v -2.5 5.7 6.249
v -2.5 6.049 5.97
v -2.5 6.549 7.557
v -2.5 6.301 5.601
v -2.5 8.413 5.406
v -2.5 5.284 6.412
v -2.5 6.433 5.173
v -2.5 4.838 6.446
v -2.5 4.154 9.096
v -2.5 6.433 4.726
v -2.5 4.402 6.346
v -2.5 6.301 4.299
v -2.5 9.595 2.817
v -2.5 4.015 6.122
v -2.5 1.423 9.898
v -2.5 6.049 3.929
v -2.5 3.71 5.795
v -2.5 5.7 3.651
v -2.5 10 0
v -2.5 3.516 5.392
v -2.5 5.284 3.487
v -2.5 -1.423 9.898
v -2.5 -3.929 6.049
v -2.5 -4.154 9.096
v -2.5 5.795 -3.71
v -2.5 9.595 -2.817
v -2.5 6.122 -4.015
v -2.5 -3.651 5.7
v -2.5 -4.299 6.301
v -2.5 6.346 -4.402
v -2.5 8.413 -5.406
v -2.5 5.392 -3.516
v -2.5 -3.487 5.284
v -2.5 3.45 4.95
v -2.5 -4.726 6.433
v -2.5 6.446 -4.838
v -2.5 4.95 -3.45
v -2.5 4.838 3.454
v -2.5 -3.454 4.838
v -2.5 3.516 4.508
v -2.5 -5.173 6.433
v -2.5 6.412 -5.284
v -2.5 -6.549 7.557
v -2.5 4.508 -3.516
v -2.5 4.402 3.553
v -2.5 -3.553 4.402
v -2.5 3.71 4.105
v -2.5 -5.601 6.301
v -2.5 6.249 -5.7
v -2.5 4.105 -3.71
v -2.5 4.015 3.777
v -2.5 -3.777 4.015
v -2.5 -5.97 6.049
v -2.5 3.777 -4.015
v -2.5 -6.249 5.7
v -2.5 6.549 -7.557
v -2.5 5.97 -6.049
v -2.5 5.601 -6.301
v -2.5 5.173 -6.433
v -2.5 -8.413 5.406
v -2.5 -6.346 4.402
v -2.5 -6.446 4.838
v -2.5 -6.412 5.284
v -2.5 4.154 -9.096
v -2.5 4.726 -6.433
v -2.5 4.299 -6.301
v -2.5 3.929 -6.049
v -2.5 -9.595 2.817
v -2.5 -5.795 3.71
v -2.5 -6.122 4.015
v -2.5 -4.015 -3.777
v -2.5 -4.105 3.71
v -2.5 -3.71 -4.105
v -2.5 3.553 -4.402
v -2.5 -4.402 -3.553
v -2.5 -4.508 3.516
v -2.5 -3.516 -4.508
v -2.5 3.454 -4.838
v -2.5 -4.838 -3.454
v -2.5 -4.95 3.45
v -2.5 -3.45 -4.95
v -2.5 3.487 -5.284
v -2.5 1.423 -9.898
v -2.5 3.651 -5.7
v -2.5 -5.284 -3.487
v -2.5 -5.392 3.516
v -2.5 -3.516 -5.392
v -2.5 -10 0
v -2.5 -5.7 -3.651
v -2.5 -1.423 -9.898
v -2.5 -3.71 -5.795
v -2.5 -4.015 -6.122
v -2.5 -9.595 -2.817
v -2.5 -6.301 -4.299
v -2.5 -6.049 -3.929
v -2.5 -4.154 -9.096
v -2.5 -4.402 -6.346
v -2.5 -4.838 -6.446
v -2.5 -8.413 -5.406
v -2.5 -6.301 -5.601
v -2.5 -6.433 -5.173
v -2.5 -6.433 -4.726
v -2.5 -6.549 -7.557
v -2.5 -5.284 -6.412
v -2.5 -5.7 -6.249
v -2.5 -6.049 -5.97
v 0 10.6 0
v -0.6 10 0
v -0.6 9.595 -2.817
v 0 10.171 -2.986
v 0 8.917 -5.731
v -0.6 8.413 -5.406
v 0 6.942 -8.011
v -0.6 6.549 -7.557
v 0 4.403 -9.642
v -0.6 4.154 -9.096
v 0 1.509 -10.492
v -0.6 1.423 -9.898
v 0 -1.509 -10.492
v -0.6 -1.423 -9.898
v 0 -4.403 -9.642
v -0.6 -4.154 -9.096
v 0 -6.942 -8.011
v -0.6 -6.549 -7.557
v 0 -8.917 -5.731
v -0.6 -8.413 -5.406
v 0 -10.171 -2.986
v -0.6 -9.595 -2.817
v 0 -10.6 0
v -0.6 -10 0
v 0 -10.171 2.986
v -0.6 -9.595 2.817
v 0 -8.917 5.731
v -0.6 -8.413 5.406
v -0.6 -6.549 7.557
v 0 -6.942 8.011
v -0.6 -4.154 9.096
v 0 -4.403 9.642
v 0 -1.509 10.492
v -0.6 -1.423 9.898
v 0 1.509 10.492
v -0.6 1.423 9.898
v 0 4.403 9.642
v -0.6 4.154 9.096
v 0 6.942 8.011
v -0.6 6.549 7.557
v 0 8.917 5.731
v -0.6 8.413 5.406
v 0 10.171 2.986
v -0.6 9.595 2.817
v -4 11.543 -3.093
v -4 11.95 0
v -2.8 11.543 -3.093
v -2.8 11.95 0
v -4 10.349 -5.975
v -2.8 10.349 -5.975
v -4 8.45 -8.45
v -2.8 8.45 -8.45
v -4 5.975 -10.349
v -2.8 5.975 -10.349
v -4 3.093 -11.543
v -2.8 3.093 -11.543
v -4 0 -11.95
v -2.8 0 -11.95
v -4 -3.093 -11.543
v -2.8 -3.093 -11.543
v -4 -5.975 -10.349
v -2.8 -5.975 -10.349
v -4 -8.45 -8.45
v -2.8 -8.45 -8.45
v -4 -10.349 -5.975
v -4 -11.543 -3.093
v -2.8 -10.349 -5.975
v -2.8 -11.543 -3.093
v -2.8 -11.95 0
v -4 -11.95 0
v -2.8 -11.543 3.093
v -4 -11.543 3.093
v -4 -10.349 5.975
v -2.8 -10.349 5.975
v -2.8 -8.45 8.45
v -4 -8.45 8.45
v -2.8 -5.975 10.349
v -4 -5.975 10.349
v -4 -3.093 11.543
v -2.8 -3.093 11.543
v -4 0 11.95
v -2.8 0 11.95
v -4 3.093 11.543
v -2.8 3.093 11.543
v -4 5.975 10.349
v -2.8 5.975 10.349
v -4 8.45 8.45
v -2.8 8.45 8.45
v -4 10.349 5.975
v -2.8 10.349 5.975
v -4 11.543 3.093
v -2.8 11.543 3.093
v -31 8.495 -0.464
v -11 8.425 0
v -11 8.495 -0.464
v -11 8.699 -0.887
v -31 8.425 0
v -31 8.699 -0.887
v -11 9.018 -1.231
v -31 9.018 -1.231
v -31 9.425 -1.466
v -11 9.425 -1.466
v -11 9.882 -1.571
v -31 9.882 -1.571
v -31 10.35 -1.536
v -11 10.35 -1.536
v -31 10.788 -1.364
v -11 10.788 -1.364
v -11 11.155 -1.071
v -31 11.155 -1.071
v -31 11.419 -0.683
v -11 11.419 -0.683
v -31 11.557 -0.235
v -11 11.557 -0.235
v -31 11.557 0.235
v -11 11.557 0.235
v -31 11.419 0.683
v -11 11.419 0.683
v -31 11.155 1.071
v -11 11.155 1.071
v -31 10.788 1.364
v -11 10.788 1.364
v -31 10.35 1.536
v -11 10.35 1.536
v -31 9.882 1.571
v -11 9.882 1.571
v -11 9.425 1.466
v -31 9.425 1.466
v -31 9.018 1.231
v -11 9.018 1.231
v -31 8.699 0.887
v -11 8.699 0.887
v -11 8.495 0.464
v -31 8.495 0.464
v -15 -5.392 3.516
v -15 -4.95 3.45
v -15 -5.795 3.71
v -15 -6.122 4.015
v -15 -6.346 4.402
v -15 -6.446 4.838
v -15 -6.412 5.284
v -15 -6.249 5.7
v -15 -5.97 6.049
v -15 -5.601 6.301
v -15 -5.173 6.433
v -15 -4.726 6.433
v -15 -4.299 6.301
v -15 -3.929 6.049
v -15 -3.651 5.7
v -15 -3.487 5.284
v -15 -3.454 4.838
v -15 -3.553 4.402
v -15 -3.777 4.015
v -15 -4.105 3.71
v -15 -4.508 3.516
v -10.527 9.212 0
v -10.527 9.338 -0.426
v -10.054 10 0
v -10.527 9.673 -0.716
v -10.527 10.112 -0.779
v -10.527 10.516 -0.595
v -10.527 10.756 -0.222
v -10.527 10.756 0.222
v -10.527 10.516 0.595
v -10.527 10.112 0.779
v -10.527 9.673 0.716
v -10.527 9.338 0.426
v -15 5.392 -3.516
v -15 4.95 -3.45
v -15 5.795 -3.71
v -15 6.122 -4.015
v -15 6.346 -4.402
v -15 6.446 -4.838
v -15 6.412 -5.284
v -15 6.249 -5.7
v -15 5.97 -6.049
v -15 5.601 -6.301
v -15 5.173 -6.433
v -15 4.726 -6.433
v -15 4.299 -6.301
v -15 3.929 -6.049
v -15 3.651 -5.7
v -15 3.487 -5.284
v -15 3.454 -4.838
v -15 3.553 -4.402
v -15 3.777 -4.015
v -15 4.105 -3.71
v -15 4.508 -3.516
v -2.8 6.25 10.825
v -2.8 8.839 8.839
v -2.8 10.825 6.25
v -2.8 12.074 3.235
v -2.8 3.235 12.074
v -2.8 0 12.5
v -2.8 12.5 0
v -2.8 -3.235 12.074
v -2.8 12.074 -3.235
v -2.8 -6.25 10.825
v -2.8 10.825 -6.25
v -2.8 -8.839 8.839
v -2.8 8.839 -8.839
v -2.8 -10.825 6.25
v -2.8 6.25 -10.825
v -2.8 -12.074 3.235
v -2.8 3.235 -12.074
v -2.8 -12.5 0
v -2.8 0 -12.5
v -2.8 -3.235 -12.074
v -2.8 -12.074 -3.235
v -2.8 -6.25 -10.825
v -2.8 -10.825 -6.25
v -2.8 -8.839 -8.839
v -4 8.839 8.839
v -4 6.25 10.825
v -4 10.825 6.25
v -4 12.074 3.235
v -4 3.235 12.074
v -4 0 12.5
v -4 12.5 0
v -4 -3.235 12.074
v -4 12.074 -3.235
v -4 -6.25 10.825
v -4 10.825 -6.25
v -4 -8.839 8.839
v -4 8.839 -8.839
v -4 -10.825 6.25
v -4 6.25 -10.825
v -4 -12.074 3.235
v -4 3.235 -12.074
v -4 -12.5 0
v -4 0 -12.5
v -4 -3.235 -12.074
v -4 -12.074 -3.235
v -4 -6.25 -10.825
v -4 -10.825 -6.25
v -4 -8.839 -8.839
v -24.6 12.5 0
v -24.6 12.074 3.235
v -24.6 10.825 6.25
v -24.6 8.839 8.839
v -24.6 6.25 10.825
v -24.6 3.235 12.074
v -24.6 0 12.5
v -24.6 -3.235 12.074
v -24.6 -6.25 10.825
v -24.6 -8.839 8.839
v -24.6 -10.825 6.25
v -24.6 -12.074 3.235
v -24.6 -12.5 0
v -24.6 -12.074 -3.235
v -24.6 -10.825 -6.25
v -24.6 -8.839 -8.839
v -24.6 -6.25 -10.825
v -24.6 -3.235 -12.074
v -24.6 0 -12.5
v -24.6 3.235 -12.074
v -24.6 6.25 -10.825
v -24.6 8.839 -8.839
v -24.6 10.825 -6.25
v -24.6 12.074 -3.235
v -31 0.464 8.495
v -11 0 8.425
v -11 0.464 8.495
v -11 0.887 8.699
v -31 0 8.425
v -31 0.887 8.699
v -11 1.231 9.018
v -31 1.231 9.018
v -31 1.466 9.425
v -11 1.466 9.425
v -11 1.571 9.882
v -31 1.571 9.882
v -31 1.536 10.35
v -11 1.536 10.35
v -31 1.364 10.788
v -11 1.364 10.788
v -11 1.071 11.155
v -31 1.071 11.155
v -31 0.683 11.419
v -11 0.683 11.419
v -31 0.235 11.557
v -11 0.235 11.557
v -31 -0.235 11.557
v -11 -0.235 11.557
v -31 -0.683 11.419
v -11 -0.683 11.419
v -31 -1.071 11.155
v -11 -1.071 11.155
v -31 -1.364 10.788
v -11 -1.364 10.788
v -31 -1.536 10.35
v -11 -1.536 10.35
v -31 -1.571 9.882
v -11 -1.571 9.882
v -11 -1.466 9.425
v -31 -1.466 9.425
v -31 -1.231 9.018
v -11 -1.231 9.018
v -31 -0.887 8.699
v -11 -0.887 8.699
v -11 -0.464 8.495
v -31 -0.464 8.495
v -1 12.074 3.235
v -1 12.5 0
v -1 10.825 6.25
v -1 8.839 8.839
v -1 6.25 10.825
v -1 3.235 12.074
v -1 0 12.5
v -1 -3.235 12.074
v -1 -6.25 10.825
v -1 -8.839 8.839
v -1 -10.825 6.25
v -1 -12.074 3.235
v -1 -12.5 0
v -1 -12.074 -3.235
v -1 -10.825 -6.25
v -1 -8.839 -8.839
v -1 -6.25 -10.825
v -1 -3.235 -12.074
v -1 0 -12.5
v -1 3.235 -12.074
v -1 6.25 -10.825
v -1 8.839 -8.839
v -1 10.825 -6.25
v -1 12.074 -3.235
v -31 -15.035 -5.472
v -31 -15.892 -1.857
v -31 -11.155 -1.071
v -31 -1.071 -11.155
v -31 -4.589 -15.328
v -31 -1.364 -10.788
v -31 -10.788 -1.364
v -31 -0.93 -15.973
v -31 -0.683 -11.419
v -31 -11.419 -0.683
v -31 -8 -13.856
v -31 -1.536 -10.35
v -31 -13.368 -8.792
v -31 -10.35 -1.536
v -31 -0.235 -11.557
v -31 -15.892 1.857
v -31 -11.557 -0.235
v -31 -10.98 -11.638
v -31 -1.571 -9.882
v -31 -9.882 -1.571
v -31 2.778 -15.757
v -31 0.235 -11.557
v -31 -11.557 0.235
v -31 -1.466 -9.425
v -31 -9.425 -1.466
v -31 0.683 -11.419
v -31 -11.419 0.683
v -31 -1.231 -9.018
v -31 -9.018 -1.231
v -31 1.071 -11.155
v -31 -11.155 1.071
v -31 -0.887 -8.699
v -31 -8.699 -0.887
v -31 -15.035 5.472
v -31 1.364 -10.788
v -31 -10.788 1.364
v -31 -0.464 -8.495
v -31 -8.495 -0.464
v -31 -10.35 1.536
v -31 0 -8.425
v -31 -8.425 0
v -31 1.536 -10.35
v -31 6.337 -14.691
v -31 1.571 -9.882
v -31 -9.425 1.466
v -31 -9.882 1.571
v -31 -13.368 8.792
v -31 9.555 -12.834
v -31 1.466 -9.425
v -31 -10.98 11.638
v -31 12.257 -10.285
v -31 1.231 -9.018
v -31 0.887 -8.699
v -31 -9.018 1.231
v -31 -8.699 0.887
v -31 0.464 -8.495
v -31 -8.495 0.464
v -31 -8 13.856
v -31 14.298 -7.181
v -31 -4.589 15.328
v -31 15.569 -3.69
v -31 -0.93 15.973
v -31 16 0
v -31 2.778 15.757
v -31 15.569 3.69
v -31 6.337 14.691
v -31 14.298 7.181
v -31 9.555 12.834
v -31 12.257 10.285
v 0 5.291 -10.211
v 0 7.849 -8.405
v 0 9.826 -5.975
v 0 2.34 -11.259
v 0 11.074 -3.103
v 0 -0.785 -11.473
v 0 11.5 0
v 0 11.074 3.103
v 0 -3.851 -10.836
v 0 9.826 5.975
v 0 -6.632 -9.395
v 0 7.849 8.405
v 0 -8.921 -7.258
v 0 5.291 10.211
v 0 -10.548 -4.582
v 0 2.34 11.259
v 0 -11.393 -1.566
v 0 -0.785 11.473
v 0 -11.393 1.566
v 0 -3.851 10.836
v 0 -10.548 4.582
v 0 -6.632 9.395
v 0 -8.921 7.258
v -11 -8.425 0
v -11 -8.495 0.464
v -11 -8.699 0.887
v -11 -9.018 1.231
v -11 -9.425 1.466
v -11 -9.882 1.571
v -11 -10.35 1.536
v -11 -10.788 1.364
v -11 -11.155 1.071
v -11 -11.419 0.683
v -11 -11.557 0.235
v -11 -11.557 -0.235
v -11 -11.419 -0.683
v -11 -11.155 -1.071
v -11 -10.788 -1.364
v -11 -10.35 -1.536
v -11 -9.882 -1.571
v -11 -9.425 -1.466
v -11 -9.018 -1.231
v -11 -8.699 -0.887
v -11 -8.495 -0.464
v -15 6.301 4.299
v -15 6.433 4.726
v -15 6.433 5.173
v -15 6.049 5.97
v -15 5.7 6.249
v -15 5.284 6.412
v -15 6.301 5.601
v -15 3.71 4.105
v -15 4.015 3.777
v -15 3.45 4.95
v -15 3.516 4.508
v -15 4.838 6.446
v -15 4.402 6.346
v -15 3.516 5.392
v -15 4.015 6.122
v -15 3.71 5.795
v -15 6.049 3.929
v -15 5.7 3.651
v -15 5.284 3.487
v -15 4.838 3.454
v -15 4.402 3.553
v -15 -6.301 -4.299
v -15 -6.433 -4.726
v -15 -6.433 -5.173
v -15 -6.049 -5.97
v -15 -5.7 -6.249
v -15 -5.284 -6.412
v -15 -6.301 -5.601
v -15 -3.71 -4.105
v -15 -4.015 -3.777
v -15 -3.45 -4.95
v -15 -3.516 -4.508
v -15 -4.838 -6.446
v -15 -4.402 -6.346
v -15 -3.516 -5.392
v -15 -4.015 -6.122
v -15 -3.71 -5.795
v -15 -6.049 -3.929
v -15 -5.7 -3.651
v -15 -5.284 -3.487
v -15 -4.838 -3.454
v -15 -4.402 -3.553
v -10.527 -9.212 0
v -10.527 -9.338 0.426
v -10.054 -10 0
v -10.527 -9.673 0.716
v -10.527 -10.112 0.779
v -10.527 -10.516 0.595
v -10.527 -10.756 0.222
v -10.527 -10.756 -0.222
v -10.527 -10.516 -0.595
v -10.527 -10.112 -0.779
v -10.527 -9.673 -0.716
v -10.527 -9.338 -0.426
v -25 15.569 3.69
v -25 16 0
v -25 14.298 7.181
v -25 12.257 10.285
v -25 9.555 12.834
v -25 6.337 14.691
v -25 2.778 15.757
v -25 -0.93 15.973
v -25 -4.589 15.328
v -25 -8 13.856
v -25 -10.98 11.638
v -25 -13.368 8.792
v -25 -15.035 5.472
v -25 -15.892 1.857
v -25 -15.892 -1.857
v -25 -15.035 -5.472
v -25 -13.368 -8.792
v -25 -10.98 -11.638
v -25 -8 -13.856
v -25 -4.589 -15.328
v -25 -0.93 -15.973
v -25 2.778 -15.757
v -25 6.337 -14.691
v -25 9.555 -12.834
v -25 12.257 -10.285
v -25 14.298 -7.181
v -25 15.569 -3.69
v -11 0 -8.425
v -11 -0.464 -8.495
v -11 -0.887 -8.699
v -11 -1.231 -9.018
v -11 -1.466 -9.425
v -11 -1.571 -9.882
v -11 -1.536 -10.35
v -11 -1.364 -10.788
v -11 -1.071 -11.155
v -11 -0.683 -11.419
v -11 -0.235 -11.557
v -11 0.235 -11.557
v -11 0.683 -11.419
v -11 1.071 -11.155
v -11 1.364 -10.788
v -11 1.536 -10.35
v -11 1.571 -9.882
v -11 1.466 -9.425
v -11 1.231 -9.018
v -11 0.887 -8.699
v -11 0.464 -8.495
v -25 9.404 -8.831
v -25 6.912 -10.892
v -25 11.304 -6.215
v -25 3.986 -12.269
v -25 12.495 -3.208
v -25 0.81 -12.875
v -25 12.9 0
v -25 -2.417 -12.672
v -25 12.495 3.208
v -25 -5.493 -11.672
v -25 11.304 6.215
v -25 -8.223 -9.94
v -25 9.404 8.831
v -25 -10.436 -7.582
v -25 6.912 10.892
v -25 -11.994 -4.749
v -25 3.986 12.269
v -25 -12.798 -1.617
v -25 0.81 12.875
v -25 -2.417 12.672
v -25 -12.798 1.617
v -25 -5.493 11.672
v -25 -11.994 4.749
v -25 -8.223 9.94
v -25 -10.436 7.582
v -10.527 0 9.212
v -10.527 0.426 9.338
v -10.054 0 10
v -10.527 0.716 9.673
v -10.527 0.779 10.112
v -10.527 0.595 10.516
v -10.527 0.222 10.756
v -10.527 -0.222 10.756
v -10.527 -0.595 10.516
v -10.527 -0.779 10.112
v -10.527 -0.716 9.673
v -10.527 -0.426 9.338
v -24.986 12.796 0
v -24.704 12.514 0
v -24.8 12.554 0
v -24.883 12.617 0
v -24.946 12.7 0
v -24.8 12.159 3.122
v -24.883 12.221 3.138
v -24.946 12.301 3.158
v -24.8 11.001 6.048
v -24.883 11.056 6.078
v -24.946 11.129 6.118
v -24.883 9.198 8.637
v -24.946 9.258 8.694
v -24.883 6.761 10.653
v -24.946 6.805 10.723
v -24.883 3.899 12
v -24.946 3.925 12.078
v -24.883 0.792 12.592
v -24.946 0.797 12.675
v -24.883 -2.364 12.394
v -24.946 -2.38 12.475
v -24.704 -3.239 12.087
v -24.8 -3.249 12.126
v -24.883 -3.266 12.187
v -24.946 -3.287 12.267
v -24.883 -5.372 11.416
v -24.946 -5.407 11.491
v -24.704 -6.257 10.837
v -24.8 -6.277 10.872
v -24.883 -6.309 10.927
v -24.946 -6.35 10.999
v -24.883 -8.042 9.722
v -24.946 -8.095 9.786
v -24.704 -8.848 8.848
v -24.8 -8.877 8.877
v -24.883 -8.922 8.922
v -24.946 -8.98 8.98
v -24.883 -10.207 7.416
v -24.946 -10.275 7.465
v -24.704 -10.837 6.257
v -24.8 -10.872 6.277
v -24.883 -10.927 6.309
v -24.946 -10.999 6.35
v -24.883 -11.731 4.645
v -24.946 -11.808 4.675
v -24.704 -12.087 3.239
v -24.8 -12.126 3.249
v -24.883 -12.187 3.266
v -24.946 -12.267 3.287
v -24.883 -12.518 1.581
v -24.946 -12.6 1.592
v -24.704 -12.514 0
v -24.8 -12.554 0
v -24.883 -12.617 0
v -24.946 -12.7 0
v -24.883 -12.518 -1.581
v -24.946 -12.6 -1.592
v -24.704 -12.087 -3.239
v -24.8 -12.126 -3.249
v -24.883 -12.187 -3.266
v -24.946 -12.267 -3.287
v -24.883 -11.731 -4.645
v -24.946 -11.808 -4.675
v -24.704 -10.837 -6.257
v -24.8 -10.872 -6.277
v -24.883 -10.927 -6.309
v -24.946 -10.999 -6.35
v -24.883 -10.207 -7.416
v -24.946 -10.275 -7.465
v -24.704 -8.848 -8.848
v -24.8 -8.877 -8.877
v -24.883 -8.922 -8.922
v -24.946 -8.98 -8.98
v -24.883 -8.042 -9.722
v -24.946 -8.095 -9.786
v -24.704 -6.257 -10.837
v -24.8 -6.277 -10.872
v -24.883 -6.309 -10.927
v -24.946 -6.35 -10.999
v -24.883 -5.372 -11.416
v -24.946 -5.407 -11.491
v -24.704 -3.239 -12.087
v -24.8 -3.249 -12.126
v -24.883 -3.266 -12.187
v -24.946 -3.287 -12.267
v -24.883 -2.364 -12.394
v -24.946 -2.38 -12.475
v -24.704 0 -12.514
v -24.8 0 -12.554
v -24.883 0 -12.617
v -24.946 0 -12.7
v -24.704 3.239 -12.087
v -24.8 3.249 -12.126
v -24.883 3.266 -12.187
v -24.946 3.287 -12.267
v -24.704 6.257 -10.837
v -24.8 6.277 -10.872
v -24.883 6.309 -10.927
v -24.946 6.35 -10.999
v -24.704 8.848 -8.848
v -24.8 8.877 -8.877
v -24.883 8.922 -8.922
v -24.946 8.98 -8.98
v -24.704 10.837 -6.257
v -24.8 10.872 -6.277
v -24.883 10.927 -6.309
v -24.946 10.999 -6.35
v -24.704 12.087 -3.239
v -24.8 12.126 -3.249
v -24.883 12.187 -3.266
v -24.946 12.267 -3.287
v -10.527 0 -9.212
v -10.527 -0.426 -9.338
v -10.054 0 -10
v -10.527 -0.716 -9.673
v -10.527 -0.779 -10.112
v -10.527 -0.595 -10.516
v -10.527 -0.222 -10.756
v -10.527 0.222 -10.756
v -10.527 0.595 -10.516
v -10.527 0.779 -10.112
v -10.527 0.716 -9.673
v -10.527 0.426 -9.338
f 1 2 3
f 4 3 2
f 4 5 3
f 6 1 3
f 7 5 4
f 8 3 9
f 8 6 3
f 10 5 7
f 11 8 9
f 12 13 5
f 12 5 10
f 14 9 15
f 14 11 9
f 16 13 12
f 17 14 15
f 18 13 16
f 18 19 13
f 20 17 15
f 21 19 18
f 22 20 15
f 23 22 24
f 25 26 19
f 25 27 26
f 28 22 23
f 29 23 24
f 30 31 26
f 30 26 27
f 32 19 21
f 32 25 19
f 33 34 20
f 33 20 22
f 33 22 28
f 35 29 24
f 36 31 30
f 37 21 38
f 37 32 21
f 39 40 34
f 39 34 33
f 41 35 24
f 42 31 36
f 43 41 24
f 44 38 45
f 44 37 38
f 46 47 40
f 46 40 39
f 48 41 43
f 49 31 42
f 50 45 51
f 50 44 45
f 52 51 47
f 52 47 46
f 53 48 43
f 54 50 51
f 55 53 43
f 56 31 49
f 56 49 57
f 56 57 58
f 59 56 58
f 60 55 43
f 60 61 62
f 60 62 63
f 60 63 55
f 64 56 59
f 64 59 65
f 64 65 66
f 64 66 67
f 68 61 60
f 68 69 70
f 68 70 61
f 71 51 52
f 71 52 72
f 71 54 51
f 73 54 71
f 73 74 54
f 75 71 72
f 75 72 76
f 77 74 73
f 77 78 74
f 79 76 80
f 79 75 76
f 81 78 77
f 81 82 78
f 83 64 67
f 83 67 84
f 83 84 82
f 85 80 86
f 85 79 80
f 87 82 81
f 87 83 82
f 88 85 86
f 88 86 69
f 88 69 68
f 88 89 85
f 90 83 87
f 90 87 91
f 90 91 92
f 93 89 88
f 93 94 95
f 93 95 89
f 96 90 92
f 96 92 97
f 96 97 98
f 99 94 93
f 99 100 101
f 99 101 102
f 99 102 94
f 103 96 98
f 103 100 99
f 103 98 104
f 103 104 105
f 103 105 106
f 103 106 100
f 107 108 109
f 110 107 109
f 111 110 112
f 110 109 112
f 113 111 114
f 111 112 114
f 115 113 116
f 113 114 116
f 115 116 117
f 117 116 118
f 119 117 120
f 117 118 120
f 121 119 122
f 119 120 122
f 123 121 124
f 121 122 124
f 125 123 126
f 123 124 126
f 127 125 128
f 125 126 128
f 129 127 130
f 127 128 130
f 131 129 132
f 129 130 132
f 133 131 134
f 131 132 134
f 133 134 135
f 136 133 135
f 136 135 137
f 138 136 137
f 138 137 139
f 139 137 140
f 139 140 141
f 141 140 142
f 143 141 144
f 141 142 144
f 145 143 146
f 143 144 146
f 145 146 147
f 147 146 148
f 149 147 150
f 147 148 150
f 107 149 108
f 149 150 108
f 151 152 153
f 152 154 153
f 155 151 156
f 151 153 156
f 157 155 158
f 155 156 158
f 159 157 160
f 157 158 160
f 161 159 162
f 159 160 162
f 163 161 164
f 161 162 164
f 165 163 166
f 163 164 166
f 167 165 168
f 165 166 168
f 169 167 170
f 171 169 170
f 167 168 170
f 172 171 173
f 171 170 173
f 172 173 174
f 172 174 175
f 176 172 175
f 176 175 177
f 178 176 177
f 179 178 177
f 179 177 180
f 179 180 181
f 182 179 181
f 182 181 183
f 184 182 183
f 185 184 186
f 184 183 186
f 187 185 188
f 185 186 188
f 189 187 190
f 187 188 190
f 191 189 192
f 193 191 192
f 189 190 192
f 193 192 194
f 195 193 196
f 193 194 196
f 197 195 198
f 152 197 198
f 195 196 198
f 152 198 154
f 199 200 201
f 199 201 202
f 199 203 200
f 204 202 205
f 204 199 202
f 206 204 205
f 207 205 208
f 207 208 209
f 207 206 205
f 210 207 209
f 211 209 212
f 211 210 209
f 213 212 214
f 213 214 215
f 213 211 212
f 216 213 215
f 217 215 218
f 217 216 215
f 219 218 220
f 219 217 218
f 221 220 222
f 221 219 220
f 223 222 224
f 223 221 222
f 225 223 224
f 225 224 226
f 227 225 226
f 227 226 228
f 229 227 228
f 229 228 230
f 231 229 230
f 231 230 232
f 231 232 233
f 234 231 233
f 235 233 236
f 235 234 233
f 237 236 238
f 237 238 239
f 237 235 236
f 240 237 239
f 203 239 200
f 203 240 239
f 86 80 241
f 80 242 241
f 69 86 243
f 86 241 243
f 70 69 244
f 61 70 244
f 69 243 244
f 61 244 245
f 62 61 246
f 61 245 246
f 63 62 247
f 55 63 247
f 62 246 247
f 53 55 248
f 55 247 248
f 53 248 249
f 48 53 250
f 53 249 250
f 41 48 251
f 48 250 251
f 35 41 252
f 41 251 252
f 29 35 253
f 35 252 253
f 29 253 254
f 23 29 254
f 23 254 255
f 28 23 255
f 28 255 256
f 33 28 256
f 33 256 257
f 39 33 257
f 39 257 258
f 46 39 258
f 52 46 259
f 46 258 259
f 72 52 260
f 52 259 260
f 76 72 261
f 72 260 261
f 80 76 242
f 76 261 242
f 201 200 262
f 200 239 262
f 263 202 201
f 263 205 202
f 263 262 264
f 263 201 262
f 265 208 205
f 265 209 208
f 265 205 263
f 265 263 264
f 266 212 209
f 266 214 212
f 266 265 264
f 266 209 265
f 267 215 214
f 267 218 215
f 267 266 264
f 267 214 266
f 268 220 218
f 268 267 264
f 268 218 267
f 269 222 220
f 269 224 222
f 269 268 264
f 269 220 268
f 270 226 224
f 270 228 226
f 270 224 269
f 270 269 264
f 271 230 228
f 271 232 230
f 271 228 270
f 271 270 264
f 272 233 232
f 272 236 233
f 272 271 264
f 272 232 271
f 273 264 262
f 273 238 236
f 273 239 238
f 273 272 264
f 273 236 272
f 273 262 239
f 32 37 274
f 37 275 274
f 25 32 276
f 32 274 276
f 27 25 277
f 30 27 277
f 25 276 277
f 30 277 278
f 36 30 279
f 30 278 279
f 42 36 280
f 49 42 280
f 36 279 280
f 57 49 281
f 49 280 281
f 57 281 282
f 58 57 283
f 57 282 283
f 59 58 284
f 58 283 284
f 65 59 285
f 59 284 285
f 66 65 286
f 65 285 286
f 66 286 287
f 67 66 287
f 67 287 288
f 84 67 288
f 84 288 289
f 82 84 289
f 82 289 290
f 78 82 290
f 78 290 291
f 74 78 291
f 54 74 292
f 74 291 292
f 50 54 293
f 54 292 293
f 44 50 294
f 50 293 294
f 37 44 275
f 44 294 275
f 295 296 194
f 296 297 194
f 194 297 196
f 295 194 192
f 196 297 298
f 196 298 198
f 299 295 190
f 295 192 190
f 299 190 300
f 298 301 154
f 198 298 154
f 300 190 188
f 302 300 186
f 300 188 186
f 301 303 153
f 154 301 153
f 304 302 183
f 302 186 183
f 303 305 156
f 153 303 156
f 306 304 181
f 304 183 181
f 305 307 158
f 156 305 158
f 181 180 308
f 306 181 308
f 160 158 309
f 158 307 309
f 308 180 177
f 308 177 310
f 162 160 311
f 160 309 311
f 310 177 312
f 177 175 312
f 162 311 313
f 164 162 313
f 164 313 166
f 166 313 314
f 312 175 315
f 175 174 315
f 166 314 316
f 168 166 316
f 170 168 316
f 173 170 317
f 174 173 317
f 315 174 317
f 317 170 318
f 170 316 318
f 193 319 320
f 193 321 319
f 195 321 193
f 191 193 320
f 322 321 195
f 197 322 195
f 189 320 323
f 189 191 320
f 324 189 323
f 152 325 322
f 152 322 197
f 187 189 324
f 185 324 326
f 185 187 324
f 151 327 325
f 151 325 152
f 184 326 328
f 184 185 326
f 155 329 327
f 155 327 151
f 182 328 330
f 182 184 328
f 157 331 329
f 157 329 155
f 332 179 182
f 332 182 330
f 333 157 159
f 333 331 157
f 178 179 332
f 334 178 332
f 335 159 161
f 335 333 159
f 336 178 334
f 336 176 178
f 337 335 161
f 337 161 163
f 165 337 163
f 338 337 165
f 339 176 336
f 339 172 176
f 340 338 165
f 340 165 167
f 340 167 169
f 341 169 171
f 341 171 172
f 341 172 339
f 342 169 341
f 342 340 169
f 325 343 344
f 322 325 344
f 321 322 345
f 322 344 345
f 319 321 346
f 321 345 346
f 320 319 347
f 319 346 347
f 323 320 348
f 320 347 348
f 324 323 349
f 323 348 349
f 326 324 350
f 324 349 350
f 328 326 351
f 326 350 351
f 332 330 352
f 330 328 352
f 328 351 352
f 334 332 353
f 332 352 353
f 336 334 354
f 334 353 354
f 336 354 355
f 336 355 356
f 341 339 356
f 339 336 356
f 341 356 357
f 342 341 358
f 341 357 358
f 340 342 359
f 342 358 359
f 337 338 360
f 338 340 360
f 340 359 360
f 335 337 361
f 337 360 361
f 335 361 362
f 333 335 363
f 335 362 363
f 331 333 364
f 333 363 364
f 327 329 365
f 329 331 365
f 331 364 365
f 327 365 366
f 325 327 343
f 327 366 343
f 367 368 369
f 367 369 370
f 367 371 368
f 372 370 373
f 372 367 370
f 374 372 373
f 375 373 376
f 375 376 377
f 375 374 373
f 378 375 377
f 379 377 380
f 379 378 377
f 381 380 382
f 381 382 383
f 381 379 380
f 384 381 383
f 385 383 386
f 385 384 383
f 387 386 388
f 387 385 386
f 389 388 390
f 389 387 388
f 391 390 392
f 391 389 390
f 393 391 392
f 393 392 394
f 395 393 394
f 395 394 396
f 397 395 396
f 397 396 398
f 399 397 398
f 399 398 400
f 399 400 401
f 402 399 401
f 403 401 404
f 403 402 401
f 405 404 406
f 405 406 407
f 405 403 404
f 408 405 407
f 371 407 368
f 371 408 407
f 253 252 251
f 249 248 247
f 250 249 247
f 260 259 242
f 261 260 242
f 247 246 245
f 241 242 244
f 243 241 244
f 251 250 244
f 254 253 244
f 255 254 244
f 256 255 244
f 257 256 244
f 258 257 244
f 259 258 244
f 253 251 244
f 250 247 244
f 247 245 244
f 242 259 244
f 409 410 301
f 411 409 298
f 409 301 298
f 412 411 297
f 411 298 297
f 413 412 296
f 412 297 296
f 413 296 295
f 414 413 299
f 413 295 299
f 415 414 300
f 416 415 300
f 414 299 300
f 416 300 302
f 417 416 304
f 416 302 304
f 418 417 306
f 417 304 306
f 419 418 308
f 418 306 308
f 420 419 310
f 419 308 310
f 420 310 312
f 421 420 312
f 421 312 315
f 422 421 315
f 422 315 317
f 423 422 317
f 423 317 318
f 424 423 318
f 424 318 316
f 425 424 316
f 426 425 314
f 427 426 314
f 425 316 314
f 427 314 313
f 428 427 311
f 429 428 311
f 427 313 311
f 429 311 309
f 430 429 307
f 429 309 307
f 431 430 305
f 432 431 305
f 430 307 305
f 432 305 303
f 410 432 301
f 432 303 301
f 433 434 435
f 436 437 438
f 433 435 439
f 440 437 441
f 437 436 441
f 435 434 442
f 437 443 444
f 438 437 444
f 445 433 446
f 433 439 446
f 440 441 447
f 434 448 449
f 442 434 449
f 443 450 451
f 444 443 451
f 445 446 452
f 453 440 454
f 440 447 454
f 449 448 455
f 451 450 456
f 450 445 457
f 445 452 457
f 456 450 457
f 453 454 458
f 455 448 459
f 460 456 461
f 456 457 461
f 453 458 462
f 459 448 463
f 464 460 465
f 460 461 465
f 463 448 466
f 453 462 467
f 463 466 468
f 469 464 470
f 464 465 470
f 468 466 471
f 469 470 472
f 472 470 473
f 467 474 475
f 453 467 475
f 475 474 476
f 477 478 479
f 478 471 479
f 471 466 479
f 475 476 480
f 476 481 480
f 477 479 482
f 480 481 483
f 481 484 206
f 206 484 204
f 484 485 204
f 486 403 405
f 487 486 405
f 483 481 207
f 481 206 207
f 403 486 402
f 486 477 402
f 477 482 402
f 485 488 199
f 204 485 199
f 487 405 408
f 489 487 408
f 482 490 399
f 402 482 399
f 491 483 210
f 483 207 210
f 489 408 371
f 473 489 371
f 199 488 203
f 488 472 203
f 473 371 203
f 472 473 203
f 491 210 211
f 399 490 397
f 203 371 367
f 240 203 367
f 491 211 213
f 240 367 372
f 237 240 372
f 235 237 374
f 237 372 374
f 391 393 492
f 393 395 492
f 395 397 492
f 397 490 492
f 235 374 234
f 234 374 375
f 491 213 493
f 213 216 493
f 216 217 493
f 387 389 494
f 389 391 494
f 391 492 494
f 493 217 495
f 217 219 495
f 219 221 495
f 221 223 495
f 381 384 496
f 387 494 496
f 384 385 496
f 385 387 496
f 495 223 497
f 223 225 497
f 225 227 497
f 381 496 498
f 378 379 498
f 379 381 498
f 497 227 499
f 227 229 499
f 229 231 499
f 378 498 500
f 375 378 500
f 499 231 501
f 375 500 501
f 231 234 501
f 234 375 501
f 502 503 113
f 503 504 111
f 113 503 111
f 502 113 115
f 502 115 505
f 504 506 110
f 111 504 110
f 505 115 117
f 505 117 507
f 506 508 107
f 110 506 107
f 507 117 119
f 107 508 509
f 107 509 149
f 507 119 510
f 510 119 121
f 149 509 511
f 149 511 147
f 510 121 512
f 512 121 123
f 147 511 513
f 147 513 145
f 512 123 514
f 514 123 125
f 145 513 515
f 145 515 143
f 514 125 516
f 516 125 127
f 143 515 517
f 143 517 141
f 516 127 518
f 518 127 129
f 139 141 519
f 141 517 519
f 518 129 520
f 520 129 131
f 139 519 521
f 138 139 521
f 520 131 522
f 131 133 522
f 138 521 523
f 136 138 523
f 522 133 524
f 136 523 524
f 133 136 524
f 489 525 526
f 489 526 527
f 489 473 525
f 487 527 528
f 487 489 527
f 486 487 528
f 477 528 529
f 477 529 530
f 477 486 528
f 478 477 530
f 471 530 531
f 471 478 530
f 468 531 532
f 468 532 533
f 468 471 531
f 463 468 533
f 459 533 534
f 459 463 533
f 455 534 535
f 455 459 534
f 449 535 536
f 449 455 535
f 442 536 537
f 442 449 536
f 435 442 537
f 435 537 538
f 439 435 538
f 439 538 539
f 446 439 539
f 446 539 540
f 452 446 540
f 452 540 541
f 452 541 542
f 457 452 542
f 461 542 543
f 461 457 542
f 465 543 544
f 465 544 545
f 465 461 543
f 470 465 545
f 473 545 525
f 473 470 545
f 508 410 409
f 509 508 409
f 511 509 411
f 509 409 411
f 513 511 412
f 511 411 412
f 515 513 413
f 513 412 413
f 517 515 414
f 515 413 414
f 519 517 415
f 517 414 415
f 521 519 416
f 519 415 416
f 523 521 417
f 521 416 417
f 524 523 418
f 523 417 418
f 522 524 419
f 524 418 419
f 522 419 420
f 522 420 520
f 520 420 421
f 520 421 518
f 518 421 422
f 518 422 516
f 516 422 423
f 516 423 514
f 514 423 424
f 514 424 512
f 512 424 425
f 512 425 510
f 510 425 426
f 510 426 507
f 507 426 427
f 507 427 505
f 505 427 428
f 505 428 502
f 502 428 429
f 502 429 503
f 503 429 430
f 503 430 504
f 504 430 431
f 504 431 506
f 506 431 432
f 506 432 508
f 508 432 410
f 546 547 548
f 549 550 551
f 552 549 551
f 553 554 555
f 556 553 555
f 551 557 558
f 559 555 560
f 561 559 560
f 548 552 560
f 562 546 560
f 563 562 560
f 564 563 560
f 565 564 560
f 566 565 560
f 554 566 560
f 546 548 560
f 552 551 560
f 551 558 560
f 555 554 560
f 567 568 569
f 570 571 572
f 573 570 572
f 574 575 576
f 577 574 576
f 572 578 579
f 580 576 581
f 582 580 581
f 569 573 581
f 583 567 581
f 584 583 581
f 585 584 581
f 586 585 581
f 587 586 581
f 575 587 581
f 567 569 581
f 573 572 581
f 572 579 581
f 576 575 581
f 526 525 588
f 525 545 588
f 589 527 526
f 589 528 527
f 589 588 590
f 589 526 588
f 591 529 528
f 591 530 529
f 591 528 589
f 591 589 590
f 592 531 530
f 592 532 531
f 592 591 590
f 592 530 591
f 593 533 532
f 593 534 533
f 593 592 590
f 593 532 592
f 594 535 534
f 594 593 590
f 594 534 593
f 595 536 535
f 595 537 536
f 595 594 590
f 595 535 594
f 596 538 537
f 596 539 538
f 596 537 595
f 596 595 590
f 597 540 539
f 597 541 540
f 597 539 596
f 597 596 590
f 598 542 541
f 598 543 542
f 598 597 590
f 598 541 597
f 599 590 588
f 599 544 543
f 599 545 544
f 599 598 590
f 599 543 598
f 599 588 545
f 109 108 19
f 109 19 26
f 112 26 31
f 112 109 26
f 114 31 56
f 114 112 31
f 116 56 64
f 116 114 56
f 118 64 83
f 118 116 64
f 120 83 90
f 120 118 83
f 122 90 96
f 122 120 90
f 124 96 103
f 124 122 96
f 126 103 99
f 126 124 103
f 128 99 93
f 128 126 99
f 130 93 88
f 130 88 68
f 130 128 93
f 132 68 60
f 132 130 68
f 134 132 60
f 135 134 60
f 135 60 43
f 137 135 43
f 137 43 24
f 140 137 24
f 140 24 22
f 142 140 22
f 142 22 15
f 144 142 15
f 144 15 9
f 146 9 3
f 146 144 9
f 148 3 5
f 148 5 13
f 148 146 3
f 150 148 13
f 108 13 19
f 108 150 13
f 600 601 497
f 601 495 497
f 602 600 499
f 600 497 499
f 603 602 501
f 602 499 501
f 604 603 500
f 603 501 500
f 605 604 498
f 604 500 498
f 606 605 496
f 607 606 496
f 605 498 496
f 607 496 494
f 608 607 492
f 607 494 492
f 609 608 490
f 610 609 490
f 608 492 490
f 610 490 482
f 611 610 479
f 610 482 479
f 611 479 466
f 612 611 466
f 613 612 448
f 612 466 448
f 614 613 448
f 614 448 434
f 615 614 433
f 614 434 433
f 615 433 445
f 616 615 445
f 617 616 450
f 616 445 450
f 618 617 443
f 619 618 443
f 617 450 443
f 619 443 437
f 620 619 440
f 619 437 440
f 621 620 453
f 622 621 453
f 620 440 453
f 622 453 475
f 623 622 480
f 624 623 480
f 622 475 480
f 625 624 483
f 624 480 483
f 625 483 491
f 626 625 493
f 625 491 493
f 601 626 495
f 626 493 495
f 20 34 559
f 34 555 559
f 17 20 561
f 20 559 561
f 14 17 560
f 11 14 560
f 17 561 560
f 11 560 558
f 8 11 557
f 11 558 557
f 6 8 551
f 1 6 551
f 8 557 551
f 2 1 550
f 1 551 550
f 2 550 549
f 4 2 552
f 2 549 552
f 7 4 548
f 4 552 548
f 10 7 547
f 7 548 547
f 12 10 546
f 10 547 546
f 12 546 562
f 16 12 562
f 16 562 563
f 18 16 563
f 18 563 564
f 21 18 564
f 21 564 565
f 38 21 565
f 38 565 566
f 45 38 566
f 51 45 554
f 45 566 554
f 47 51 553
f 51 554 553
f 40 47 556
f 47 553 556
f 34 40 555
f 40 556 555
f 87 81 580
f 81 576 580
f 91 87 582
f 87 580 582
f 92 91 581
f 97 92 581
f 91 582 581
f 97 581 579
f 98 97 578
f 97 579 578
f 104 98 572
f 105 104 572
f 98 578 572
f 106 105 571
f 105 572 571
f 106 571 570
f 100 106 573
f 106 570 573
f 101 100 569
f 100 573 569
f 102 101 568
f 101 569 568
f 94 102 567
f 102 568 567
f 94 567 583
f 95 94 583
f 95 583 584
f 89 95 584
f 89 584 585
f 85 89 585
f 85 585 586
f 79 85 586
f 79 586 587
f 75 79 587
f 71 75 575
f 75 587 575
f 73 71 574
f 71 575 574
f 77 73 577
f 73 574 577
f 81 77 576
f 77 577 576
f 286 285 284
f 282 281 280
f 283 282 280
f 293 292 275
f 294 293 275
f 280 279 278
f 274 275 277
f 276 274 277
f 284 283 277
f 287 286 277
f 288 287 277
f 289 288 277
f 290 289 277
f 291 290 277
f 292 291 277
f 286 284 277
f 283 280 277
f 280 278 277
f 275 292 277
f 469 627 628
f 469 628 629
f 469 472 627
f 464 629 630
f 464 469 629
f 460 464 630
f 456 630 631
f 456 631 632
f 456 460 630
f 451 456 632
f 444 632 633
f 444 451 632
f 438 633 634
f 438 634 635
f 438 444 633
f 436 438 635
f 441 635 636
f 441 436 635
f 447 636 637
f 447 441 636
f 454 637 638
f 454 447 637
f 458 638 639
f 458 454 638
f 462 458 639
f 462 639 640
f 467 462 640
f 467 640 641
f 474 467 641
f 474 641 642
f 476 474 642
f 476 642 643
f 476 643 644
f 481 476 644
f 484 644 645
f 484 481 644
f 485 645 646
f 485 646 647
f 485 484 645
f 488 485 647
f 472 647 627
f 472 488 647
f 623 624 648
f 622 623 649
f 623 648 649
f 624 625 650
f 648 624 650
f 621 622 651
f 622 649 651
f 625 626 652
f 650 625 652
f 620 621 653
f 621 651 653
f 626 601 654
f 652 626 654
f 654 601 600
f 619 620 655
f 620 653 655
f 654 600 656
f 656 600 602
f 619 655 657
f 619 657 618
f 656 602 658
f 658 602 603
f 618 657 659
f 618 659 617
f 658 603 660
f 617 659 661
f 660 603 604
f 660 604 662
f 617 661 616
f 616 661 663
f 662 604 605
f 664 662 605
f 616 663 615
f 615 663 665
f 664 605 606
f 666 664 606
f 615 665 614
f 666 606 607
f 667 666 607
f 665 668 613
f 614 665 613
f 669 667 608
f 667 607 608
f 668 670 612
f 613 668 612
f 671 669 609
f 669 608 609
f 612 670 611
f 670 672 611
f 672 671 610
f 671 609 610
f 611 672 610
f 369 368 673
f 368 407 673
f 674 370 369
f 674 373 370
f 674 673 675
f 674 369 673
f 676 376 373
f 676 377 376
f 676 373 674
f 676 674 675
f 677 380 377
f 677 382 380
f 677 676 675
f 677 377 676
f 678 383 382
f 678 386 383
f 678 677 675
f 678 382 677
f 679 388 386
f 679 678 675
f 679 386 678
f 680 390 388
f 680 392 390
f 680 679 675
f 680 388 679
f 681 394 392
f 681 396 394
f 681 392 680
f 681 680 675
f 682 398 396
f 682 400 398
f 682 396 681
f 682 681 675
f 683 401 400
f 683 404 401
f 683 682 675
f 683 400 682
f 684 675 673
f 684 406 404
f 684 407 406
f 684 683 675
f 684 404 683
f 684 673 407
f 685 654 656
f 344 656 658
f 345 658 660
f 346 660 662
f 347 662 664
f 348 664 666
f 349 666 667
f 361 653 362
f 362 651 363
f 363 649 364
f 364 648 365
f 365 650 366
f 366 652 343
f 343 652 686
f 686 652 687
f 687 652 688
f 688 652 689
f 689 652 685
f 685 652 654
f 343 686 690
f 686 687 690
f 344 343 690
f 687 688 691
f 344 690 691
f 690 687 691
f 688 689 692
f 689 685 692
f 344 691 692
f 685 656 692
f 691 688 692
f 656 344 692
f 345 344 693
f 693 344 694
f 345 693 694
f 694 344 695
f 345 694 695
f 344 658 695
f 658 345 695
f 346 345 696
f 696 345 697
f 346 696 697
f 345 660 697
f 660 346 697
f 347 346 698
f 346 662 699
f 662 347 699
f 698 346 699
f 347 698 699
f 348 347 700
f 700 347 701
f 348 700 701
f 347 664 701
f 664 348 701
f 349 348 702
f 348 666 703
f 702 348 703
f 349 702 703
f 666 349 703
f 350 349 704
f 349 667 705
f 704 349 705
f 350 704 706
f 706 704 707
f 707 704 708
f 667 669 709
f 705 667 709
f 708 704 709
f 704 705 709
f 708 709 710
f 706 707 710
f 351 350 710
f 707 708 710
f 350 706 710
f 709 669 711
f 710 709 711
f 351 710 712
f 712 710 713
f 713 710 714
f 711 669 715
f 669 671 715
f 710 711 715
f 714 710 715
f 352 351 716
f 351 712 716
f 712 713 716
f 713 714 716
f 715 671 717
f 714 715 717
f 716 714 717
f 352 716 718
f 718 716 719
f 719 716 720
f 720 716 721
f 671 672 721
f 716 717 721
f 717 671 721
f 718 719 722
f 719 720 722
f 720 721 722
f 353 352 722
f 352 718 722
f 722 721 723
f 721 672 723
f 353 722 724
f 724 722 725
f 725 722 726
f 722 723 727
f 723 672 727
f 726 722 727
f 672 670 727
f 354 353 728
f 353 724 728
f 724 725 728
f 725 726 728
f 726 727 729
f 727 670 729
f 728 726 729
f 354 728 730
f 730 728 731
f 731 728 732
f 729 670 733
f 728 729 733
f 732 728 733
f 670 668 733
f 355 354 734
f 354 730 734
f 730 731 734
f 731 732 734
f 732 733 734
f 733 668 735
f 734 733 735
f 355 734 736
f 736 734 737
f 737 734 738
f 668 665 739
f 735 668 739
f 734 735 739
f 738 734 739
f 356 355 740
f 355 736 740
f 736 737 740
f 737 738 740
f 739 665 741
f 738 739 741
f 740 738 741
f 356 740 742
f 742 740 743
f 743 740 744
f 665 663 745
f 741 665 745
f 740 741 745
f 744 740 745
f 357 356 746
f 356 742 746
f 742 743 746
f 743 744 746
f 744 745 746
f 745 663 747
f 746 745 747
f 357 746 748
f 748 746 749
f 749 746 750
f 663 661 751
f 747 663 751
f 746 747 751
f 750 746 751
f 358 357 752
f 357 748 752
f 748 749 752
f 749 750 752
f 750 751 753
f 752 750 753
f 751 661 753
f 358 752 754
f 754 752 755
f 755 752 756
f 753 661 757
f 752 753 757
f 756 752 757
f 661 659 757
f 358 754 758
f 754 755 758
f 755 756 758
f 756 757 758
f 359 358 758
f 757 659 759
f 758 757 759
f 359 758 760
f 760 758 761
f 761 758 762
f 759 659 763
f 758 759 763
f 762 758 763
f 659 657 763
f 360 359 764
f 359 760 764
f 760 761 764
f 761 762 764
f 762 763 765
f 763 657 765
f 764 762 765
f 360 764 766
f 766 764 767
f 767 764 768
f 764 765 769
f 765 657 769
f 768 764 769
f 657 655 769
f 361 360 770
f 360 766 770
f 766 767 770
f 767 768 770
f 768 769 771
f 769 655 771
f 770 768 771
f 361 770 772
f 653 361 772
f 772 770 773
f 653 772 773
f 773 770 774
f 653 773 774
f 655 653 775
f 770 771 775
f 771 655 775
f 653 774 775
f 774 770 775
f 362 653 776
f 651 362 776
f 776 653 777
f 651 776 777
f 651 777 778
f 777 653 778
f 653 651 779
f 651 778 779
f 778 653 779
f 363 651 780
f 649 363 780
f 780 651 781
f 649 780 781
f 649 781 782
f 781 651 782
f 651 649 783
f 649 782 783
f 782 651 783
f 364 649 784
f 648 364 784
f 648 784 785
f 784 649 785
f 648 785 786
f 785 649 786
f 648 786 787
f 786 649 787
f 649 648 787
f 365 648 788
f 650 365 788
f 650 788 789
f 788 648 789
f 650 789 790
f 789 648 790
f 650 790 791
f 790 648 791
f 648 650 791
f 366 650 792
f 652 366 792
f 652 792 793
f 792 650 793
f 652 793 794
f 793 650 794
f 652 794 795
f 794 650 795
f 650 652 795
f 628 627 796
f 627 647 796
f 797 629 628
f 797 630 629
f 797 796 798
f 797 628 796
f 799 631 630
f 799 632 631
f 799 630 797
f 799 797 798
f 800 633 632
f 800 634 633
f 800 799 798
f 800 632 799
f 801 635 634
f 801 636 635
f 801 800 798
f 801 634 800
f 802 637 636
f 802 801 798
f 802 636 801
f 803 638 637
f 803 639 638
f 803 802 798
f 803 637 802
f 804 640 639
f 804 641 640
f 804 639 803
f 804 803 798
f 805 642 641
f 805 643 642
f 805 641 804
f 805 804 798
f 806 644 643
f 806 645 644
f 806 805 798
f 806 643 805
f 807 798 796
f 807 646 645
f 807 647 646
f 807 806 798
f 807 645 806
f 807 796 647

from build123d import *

# Parameters (mm, degrees)
SKETCH_2_W               = 1.2
SKETCH_2_H               = 0.55
CHAMFER_1_SIZE           = 1
FILLET_1_R               = 0.4
HOLE_WIZARD_1_D          = 3
HOLE_WIZARD_1_DEPTH      = 15
PATTERN_CIRCULAR_1_COUNT = 4
SKETCH_5_W               = 2.5
SKETCH_5_H               = 10
CHAMFER_2_SIZE           = 0.6
PATTERN_CIRCULAR_2_COUNT = 4


with BuildPart() as part:
    # Эскиз1 → Повернуть1 (revolve)
    with BuildSketch(Plane.XY):
        Polygon((0, 0), (0, 12.5), (-25, 12.5), (-25, 16), (-31, 16), (-31, 0), align=None)
    revolve(axis=Axis((0, 0, 0), (1, 0, 0)))

    # Эскиз2 → Вырез-Повернуть1 (revolve, cut)
    with BuildSketch(Plane.XY):
        with Locations((-3.4, 12.225)):
            Rectangle(SKETCH_2_W, SKETCH_2_H)
    revolve(axis=Axis((0, 0, 0), (-1, 0, 0)), mode=Mode.SUBTRACT)

    # Фаска1
    chamfer_1_edges = [part.edges().sort_by_distance(p)[0] for p in [
        (0, -12.5, 0),
    ]]
    chamfer(chamfer_1_edges, length=CHAMFER_1_SIZE)

    # Скругление1
    fillet_1_edges = [part.edges().sort_by_distance(p)[0] for p in [
        (-25, -12.5, 0),
    ]]
    fillet(fillet_1_edges, radius=FILLET_1_R)

    # Отверстие1
    with Locations(Plane(origin=(0, 0, 0), x_dir=(0, 0, -1), z_dir=(1, 0, 0))):
        with Locations((4.949747468, 4.949747468)):
            hole_wizard_1 = Hole(HOLE_WIZARD_1_D / 2, depth=HOLE_WIZARD_1_DEPTH)

    # Круговой массив1: Отверстие1 ×4 about axis
    pattern_circular_1_axis = Axis((0, 0, 0), (1, 0, 0))
    for i in range(1, PATTERN_CIRCULAR_1_COUNT):
        add(hole_wizard_1.rotate(pattern_circular_1_axis, i * 360 / PATTERN_CIRCULAR_1_COUNT), mode=Mode.SUBTRACT)

    # Эскиз5 → Вырез-Повернуть2 (revolve, cut)
    with BuildSketch(Plane.XY):
        with Locations((-1.25, 5)):
            Rectangle(SKETCH_5_W, SKETCH_5_H)
    revolve(axis=Axis((0, 0, 0), (-1, 0, 0)), mode=Mode.SUBTRACT)

    # Фаска2
    chamfer_2_edges = [part.edges().sort_by_distance(p)[0] for p in [
        (0, -10, 0),
    ]]
    chamfer(chamfer_2_edges, length=CHAMFER_2_SIZE)

    # Эскиз7 → Сверло под метчик  спиральное M31 (revolve, cut)
    with BuildSketch(Plane(origin=(-31, 0, -10), x_dir=(0, 0, 1), z_dir=(0, 1, 0))):
        Polygon((0, 0), (0, 20.946355475), (1.575, 20), (1.575, 0), align=None)
    hole_wizard_m31 = revolve(axis=Axis((-37.35, 0, -10), (1, 0, 0)), mode=Mode.SUBTRACT)

    # Круговой массив2: Сверло под метчик  спиральное M31 ×4 about axis
    pattern_circular_2_axis = Axis((0, 0, 0), (1, 0, 0))
    for i in range(1, PATTERN_CIRCULAR_2_COUNT):
        add(hole_wizard_m31.rotate(pattern_circular_2_axis, i * 360 / PATTERN_CIRCULAR_2_COUNT), mode=Mode.SUBTRACT)


solid = part.part
